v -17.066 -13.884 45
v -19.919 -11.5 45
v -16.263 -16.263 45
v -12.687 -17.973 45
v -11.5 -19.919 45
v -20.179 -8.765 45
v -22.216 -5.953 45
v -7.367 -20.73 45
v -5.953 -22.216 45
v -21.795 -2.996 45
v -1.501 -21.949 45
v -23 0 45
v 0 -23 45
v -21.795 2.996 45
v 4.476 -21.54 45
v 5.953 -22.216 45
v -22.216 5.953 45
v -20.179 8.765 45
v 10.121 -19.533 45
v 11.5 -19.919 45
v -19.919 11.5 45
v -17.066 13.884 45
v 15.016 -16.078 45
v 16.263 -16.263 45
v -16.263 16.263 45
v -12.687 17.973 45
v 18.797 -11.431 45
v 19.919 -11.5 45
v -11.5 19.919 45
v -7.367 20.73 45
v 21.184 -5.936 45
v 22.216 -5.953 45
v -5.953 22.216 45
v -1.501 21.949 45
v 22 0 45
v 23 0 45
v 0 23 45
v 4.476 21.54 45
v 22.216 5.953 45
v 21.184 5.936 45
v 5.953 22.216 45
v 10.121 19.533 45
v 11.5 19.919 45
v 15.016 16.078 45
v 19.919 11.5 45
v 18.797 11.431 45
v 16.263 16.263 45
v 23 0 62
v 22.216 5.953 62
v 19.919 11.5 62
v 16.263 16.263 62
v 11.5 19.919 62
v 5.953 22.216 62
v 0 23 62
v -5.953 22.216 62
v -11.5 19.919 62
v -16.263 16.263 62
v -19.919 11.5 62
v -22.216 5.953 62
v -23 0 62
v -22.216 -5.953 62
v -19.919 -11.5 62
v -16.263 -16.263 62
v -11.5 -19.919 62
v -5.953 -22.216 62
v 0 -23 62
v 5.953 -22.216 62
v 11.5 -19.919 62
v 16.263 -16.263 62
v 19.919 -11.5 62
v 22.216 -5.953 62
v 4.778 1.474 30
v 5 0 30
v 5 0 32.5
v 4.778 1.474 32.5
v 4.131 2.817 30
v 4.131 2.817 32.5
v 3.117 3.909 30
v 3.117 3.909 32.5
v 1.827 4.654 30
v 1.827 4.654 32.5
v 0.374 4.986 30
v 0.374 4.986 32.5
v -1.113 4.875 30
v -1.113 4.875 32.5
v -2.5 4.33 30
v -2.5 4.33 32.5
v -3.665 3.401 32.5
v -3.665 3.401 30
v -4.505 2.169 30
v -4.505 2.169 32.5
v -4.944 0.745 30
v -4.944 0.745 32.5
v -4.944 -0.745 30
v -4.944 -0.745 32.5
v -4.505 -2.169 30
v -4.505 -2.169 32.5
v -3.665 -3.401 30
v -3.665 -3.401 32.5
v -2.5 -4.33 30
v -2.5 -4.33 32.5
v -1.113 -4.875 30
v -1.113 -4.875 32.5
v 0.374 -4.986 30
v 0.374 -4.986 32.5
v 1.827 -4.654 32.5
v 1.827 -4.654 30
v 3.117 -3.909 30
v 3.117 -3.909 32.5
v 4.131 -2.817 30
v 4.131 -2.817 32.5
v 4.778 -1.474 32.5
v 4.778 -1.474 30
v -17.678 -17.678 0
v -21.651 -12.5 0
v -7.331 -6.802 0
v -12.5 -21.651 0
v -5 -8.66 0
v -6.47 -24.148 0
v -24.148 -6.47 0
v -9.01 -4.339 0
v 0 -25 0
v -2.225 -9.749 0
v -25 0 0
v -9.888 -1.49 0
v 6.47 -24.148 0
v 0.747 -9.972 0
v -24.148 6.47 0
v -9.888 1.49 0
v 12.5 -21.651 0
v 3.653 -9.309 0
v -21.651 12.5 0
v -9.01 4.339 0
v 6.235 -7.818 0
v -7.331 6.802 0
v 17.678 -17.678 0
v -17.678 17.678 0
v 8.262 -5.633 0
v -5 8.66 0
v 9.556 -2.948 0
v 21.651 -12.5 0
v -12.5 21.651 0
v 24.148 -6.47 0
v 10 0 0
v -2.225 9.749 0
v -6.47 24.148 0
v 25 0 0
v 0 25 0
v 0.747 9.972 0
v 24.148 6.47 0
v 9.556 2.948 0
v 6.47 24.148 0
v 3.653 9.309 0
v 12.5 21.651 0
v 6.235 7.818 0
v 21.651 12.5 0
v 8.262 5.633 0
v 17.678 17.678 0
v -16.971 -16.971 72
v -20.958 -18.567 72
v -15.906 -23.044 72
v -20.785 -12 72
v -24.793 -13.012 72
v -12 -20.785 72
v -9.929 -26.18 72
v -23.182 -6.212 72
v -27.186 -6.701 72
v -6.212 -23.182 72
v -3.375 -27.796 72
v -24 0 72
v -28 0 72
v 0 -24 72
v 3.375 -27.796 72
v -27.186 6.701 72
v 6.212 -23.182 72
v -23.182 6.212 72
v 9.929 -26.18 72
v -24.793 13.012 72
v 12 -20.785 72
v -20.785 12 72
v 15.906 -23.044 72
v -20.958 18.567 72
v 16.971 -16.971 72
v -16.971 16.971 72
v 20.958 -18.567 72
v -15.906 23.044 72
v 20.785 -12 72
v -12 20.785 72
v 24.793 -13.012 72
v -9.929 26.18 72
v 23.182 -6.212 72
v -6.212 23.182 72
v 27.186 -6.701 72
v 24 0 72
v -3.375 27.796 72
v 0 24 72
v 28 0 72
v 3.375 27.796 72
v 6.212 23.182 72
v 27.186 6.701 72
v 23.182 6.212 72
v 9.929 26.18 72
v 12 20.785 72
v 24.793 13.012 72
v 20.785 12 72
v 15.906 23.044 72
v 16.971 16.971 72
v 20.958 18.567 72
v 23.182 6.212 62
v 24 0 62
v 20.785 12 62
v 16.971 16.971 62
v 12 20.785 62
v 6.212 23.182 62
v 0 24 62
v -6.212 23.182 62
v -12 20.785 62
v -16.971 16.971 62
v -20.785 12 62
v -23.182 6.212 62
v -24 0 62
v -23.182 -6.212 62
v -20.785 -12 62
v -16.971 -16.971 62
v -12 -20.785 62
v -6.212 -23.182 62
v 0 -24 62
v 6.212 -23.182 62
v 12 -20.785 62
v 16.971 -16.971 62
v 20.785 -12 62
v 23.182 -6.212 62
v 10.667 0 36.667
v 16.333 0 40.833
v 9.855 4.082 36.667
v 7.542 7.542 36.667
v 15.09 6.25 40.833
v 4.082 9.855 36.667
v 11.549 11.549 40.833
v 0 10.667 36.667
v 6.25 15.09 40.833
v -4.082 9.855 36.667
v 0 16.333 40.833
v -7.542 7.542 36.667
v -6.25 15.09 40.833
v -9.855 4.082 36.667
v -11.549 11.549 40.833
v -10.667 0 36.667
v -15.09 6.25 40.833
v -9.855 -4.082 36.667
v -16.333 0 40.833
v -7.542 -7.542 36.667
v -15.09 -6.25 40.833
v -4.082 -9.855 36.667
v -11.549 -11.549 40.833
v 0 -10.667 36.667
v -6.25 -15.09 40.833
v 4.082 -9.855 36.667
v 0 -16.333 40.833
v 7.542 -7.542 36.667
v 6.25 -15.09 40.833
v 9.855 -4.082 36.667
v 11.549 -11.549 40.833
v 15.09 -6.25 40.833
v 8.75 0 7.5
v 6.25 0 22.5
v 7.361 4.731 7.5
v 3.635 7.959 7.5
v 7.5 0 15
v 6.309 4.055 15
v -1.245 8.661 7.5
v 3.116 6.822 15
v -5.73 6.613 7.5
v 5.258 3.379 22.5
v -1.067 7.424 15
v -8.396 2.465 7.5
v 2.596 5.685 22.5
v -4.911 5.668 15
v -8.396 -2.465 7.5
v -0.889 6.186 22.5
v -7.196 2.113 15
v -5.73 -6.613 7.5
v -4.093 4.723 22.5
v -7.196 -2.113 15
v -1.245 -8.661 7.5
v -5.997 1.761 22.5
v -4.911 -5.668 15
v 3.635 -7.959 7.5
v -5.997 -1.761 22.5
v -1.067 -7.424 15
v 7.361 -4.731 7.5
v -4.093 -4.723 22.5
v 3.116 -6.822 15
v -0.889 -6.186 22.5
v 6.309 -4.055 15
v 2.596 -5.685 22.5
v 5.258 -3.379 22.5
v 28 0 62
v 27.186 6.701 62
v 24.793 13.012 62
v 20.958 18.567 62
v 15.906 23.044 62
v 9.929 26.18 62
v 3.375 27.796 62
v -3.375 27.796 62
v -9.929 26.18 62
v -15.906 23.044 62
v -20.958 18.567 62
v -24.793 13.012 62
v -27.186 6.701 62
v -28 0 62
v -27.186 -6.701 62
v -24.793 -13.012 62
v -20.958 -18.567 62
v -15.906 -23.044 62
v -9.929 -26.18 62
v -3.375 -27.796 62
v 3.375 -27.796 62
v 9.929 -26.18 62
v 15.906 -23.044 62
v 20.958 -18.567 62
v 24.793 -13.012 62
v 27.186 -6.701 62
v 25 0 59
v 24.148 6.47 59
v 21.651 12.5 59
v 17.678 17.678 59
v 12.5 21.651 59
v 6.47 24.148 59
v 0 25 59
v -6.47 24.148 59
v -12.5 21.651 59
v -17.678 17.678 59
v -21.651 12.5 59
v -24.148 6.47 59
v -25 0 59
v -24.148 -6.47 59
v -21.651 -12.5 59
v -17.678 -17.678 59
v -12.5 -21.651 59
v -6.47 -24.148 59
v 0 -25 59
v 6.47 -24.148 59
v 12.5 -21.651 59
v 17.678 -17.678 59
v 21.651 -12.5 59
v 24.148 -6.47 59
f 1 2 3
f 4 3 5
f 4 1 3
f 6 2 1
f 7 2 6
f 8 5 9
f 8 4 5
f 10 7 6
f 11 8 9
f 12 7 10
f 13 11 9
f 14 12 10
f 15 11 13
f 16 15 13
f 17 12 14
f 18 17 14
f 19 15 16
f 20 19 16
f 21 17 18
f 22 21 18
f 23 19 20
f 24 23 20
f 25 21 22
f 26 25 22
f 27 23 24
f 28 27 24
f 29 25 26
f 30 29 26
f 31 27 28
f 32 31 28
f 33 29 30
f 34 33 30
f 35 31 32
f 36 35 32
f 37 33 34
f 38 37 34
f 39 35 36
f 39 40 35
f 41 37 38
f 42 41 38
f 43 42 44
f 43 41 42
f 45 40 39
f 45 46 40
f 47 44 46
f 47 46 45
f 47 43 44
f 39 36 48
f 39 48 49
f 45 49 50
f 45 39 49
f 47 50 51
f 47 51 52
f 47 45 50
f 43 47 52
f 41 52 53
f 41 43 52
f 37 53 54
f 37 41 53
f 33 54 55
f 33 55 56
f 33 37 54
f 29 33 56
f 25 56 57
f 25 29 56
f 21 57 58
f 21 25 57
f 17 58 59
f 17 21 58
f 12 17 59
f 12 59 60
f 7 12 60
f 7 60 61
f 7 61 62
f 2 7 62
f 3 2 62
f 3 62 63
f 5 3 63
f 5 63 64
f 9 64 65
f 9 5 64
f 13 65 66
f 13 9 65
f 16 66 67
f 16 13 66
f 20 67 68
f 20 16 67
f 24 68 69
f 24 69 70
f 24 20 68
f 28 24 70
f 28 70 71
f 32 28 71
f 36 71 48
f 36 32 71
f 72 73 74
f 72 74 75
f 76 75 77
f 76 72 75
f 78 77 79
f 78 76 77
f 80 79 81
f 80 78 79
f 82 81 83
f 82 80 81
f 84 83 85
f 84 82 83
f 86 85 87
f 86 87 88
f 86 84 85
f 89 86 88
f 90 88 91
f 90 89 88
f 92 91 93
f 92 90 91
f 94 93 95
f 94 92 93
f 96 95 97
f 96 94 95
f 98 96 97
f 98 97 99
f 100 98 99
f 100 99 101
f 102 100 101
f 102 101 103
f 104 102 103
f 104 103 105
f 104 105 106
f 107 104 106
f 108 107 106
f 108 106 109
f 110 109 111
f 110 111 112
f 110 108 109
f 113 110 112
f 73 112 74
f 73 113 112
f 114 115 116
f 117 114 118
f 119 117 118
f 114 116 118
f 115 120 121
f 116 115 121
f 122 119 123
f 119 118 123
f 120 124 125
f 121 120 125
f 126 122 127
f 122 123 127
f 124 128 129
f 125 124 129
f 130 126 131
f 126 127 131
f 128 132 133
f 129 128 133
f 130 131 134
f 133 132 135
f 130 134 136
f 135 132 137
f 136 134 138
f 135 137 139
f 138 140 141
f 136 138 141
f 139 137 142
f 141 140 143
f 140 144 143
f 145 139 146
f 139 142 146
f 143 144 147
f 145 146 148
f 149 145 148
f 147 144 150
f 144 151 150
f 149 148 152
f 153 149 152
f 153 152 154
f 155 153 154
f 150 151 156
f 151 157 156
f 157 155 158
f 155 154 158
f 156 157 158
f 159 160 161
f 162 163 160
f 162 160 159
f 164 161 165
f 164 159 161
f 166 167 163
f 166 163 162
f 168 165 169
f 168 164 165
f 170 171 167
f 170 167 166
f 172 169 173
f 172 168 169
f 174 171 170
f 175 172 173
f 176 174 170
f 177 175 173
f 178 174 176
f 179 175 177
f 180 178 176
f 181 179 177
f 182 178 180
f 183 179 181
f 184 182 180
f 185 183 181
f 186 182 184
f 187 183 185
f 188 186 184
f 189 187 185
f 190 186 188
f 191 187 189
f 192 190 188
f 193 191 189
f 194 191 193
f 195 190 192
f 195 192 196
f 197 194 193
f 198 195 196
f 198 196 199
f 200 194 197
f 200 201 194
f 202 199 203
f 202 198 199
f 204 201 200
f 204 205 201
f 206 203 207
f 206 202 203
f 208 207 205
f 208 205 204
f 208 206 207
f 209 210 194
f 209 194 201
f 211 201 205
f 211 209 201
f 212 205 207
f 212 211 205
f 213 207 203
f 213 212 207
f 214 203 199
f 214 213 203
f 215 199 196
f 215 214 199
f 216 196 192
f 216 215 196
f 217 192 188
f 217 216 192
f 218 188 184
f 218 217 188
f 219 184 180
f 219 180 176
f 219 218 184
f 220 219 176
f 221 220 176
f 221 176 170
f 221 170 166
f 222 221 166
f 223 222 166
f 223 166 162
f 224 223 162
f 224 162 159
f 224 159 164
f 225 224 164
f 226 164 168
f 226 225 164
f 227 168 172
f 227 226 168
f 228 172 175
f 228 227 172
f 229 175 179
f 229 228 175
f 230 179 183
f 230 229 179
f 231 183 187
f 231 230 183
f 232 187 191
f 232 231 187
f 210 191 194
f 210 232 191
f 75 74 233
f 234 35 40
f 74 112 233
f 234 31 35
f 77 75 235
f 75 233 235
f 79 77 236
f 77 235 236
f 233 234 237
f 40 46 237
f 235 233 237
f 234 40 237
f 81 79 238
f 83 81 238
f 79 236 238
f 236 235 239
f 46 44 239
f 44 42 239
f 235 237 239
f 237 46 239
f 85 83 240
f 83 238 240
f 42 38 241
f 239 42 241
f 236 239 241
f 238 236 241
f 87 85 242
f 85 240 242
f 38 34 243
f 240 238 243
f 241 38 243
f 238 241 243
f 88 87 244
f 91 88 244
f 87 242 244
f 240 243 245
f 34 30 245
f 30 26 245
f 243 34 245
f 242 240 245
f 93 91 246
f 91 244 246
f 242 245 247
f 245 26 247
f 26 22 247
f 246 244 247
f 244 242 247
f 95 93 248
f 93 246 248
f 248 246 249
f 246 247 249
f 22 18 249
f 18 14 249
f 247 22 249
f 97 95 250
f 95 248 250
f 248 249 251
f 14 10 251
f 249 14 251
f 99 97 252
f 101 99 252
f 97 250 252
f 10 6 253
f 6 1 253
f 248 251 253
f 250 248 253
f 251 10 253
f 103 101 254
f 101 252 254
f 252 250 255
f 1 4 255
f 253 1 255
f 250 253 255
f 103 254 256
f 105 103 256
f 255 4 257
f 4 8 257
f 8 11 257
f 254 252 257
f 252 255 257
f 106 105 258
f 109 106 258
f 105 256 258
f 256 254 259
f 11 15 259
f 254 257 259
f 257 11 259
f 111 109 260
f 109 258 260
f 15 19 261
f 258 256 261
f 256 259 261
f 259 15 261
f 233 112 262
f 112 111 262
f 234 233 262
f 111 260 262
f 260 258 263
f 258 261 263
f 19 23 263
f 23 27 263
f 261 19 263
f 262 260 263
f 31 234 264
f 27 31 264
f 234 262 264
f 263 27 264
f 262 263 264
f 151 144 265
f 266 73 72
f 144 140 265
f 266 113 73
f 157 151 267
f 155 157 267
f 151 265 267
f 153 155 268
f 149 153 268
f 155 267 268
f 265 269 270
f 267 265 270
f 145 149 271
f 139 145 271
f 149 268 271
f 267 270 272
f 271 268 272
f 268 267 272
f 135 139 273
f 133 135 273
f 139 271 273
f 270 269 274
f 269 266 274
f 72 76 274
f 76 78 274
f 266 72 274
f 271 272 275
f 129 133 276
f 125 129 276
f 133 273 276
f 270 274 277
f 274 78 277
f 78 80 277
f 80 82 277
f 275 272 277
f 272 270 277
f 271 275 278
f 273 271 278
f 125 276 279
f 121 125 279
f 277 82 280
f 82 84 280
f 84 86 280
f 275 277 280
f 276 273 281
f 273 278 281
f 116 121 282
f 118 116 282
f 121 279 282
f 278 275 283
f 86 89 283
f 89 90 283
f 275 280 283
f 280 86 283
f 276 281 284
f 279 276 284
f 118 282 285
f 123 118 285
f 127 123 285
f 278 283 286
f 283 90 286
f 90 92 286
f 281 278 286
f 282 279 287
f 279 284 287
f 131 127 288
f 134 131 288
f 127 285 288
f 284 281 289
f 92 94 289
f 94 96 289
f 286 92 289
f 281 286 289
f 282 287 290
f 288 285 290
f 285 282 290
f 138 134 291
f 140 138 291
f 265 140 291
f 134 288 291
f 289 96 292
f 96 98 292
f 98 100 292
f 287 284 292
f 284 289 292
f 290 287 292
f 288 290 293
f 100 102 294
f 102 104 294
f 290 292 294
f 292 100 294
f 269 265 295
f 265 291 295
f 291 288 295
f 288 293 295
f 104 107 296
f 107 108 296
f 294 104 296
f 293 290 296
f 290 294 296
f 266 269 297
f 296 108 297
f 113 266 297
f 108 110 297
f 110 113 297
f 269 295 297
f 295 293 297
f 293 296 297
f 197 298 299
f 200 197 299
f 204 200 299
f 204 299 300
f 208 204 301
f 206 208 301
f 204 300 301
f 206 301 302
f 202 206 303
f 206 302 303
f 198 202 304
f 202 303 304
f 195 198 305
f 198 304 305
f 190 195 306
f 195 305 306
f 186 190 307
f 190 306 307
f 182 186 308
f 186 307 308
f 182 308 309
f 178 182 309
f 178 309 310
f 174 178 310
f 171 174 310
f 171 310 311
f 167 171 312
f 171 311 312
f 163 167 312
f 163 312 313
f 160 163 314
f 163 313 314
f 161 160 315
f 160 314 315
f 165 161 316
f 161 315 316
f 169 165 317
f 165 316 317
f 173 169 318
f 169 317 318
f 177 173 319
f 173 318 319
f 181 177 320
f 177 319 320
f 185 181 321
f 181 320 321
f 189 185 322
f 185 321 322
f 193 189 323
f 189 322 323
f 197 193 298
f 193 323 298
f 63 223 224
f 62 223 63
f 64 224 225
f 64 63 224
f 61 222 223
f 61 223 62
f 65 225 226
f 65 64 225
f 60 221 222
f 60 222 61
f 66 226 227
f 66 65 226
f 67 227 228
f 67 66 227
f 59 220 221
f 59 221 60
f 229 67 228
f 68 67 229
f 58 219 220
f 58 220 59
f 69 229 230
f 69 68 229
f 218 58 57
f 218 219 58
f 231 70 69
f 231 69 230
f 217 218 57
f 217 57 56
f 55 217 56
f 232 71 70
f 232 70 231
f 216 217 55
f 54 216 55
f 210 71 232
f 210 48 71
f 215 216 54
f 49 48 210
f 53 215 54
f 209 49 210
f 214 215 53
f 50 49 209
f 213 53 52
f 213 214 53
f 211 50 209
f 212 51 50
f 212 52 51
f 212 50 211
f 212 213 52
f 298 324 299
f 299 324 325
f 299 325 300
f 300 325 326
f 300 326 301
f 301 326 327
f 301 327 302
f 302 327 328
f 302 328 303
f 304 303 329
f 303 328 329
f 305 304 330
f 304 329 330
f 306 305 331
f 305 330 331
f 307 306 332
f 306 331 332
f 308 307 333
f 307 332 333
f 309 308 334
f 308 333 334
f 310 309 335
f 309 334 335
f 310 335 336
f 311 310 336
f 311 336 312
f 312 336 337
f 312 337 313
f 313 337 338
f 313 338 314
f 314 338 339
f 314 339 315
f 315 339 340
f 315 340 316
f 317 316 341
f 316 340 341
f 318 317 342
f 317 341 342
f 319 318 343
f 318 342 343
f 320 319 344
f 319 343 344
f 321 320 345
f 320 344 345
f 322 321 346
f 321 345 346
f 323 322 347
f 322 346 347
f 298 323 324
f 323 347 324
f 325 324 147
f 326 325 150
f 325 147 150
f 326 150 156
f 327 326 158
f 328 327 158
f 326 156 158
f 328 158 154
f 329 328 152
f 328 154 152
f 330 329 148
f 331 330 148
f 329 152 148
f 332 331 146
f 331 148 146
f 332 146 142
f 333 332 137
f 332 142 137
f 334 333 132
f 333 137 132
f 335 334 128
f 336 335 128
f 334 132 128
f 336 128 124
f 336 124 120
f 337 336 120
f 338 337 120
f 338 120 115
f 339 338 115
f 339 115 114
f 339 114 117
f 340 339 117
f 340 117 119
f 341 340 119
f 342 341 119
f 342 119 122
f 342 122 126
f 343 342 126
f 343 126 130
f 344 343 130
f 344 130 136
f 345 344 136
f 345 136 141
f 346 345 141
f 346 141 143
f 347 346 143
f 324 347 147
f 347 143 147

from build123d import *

# Parameters (mm, degrees)
F0_R     = 25
F0_R_2   = 5
F1_DEPTH = 45
F2_SIZE2 = 17
F2_SIZE  = 12.5
F3_R     = 25
F3_R_2   = 23
F4_DEPTH = 17
F5_R     = 28
F5_R_2   = 25
F5_R_3   = 24
F6_DEPTH = 10
F7_SIZE  = 2.99999
F8_SIZE2 = 30
F8_SIZE  = 5


# Not quite as in the source:
# - a fillet or chamfer is up to 0.001 mm smaller than in the source, because OpenCascade refuses the exact size


with BuildPart() as f1:
    # F0 (on Top) → F1 (new body)
    with BuildSketch(Plane.XY):
        Circle(F0_R)
        Circle(F0_R_2, mode=Mode.SUBTRACT)
    extrude(amount=F1_DEPTH)

    # F2
    f2_edges = [f1.edges().sort_by_distance(p)[0] for p in [
        (-5, 0, 45),
    ]]
    f2_side = f1.faces().sort_by_distance((-5, 0, 22.5))[0]
    chamfer(f2_edges, length=F2_SIZE, length2=F2_SIZE2, reference=f2_side)

    # F3 (on face) → F4 (join)
    with BuildSketch(Plane.XY.offset(45)):
        Circle(F3_R)
        Circle(F3_R_2, mode=Mode.SUBTRACT)
    extrude(amount=F4_DEPTH)

    # F5 (on face) → F6 (join)
    with BuildSketch(Plane.XY.offset(62)):
        Circle(F5_R)
        Circle(F5_R_2, mode=Mode.SUBTRACT)
        Circle(F5_R_2)
        Circle(F5_R_3, mode=Mode.SUBTRACT)
    extrude(amount=F6_DEPTH)

    # F7 (size 3 in the source; OpenCascade refuses exactly that, so slightly less here)
    f7_edges = [f1.edges().sort_by_distance(p)[0] for p in [
        (-25, 0, 62),
    ]]
    chamfer(f7_edges, length=F7_SIZE)

    # F8
    f8_edges = [f1.edges().sort_by_distance(p)[0] for p in [
        (-5, 0, 0),
    ]]
    f8_side = f1.faces().sort_by_distance((-24.292893, 0, 0))[0]
    chamfer(f8_edges, length=F8_SIZE, length2=F8_SIZE2, reference=f8_side)


solid = f1.part
